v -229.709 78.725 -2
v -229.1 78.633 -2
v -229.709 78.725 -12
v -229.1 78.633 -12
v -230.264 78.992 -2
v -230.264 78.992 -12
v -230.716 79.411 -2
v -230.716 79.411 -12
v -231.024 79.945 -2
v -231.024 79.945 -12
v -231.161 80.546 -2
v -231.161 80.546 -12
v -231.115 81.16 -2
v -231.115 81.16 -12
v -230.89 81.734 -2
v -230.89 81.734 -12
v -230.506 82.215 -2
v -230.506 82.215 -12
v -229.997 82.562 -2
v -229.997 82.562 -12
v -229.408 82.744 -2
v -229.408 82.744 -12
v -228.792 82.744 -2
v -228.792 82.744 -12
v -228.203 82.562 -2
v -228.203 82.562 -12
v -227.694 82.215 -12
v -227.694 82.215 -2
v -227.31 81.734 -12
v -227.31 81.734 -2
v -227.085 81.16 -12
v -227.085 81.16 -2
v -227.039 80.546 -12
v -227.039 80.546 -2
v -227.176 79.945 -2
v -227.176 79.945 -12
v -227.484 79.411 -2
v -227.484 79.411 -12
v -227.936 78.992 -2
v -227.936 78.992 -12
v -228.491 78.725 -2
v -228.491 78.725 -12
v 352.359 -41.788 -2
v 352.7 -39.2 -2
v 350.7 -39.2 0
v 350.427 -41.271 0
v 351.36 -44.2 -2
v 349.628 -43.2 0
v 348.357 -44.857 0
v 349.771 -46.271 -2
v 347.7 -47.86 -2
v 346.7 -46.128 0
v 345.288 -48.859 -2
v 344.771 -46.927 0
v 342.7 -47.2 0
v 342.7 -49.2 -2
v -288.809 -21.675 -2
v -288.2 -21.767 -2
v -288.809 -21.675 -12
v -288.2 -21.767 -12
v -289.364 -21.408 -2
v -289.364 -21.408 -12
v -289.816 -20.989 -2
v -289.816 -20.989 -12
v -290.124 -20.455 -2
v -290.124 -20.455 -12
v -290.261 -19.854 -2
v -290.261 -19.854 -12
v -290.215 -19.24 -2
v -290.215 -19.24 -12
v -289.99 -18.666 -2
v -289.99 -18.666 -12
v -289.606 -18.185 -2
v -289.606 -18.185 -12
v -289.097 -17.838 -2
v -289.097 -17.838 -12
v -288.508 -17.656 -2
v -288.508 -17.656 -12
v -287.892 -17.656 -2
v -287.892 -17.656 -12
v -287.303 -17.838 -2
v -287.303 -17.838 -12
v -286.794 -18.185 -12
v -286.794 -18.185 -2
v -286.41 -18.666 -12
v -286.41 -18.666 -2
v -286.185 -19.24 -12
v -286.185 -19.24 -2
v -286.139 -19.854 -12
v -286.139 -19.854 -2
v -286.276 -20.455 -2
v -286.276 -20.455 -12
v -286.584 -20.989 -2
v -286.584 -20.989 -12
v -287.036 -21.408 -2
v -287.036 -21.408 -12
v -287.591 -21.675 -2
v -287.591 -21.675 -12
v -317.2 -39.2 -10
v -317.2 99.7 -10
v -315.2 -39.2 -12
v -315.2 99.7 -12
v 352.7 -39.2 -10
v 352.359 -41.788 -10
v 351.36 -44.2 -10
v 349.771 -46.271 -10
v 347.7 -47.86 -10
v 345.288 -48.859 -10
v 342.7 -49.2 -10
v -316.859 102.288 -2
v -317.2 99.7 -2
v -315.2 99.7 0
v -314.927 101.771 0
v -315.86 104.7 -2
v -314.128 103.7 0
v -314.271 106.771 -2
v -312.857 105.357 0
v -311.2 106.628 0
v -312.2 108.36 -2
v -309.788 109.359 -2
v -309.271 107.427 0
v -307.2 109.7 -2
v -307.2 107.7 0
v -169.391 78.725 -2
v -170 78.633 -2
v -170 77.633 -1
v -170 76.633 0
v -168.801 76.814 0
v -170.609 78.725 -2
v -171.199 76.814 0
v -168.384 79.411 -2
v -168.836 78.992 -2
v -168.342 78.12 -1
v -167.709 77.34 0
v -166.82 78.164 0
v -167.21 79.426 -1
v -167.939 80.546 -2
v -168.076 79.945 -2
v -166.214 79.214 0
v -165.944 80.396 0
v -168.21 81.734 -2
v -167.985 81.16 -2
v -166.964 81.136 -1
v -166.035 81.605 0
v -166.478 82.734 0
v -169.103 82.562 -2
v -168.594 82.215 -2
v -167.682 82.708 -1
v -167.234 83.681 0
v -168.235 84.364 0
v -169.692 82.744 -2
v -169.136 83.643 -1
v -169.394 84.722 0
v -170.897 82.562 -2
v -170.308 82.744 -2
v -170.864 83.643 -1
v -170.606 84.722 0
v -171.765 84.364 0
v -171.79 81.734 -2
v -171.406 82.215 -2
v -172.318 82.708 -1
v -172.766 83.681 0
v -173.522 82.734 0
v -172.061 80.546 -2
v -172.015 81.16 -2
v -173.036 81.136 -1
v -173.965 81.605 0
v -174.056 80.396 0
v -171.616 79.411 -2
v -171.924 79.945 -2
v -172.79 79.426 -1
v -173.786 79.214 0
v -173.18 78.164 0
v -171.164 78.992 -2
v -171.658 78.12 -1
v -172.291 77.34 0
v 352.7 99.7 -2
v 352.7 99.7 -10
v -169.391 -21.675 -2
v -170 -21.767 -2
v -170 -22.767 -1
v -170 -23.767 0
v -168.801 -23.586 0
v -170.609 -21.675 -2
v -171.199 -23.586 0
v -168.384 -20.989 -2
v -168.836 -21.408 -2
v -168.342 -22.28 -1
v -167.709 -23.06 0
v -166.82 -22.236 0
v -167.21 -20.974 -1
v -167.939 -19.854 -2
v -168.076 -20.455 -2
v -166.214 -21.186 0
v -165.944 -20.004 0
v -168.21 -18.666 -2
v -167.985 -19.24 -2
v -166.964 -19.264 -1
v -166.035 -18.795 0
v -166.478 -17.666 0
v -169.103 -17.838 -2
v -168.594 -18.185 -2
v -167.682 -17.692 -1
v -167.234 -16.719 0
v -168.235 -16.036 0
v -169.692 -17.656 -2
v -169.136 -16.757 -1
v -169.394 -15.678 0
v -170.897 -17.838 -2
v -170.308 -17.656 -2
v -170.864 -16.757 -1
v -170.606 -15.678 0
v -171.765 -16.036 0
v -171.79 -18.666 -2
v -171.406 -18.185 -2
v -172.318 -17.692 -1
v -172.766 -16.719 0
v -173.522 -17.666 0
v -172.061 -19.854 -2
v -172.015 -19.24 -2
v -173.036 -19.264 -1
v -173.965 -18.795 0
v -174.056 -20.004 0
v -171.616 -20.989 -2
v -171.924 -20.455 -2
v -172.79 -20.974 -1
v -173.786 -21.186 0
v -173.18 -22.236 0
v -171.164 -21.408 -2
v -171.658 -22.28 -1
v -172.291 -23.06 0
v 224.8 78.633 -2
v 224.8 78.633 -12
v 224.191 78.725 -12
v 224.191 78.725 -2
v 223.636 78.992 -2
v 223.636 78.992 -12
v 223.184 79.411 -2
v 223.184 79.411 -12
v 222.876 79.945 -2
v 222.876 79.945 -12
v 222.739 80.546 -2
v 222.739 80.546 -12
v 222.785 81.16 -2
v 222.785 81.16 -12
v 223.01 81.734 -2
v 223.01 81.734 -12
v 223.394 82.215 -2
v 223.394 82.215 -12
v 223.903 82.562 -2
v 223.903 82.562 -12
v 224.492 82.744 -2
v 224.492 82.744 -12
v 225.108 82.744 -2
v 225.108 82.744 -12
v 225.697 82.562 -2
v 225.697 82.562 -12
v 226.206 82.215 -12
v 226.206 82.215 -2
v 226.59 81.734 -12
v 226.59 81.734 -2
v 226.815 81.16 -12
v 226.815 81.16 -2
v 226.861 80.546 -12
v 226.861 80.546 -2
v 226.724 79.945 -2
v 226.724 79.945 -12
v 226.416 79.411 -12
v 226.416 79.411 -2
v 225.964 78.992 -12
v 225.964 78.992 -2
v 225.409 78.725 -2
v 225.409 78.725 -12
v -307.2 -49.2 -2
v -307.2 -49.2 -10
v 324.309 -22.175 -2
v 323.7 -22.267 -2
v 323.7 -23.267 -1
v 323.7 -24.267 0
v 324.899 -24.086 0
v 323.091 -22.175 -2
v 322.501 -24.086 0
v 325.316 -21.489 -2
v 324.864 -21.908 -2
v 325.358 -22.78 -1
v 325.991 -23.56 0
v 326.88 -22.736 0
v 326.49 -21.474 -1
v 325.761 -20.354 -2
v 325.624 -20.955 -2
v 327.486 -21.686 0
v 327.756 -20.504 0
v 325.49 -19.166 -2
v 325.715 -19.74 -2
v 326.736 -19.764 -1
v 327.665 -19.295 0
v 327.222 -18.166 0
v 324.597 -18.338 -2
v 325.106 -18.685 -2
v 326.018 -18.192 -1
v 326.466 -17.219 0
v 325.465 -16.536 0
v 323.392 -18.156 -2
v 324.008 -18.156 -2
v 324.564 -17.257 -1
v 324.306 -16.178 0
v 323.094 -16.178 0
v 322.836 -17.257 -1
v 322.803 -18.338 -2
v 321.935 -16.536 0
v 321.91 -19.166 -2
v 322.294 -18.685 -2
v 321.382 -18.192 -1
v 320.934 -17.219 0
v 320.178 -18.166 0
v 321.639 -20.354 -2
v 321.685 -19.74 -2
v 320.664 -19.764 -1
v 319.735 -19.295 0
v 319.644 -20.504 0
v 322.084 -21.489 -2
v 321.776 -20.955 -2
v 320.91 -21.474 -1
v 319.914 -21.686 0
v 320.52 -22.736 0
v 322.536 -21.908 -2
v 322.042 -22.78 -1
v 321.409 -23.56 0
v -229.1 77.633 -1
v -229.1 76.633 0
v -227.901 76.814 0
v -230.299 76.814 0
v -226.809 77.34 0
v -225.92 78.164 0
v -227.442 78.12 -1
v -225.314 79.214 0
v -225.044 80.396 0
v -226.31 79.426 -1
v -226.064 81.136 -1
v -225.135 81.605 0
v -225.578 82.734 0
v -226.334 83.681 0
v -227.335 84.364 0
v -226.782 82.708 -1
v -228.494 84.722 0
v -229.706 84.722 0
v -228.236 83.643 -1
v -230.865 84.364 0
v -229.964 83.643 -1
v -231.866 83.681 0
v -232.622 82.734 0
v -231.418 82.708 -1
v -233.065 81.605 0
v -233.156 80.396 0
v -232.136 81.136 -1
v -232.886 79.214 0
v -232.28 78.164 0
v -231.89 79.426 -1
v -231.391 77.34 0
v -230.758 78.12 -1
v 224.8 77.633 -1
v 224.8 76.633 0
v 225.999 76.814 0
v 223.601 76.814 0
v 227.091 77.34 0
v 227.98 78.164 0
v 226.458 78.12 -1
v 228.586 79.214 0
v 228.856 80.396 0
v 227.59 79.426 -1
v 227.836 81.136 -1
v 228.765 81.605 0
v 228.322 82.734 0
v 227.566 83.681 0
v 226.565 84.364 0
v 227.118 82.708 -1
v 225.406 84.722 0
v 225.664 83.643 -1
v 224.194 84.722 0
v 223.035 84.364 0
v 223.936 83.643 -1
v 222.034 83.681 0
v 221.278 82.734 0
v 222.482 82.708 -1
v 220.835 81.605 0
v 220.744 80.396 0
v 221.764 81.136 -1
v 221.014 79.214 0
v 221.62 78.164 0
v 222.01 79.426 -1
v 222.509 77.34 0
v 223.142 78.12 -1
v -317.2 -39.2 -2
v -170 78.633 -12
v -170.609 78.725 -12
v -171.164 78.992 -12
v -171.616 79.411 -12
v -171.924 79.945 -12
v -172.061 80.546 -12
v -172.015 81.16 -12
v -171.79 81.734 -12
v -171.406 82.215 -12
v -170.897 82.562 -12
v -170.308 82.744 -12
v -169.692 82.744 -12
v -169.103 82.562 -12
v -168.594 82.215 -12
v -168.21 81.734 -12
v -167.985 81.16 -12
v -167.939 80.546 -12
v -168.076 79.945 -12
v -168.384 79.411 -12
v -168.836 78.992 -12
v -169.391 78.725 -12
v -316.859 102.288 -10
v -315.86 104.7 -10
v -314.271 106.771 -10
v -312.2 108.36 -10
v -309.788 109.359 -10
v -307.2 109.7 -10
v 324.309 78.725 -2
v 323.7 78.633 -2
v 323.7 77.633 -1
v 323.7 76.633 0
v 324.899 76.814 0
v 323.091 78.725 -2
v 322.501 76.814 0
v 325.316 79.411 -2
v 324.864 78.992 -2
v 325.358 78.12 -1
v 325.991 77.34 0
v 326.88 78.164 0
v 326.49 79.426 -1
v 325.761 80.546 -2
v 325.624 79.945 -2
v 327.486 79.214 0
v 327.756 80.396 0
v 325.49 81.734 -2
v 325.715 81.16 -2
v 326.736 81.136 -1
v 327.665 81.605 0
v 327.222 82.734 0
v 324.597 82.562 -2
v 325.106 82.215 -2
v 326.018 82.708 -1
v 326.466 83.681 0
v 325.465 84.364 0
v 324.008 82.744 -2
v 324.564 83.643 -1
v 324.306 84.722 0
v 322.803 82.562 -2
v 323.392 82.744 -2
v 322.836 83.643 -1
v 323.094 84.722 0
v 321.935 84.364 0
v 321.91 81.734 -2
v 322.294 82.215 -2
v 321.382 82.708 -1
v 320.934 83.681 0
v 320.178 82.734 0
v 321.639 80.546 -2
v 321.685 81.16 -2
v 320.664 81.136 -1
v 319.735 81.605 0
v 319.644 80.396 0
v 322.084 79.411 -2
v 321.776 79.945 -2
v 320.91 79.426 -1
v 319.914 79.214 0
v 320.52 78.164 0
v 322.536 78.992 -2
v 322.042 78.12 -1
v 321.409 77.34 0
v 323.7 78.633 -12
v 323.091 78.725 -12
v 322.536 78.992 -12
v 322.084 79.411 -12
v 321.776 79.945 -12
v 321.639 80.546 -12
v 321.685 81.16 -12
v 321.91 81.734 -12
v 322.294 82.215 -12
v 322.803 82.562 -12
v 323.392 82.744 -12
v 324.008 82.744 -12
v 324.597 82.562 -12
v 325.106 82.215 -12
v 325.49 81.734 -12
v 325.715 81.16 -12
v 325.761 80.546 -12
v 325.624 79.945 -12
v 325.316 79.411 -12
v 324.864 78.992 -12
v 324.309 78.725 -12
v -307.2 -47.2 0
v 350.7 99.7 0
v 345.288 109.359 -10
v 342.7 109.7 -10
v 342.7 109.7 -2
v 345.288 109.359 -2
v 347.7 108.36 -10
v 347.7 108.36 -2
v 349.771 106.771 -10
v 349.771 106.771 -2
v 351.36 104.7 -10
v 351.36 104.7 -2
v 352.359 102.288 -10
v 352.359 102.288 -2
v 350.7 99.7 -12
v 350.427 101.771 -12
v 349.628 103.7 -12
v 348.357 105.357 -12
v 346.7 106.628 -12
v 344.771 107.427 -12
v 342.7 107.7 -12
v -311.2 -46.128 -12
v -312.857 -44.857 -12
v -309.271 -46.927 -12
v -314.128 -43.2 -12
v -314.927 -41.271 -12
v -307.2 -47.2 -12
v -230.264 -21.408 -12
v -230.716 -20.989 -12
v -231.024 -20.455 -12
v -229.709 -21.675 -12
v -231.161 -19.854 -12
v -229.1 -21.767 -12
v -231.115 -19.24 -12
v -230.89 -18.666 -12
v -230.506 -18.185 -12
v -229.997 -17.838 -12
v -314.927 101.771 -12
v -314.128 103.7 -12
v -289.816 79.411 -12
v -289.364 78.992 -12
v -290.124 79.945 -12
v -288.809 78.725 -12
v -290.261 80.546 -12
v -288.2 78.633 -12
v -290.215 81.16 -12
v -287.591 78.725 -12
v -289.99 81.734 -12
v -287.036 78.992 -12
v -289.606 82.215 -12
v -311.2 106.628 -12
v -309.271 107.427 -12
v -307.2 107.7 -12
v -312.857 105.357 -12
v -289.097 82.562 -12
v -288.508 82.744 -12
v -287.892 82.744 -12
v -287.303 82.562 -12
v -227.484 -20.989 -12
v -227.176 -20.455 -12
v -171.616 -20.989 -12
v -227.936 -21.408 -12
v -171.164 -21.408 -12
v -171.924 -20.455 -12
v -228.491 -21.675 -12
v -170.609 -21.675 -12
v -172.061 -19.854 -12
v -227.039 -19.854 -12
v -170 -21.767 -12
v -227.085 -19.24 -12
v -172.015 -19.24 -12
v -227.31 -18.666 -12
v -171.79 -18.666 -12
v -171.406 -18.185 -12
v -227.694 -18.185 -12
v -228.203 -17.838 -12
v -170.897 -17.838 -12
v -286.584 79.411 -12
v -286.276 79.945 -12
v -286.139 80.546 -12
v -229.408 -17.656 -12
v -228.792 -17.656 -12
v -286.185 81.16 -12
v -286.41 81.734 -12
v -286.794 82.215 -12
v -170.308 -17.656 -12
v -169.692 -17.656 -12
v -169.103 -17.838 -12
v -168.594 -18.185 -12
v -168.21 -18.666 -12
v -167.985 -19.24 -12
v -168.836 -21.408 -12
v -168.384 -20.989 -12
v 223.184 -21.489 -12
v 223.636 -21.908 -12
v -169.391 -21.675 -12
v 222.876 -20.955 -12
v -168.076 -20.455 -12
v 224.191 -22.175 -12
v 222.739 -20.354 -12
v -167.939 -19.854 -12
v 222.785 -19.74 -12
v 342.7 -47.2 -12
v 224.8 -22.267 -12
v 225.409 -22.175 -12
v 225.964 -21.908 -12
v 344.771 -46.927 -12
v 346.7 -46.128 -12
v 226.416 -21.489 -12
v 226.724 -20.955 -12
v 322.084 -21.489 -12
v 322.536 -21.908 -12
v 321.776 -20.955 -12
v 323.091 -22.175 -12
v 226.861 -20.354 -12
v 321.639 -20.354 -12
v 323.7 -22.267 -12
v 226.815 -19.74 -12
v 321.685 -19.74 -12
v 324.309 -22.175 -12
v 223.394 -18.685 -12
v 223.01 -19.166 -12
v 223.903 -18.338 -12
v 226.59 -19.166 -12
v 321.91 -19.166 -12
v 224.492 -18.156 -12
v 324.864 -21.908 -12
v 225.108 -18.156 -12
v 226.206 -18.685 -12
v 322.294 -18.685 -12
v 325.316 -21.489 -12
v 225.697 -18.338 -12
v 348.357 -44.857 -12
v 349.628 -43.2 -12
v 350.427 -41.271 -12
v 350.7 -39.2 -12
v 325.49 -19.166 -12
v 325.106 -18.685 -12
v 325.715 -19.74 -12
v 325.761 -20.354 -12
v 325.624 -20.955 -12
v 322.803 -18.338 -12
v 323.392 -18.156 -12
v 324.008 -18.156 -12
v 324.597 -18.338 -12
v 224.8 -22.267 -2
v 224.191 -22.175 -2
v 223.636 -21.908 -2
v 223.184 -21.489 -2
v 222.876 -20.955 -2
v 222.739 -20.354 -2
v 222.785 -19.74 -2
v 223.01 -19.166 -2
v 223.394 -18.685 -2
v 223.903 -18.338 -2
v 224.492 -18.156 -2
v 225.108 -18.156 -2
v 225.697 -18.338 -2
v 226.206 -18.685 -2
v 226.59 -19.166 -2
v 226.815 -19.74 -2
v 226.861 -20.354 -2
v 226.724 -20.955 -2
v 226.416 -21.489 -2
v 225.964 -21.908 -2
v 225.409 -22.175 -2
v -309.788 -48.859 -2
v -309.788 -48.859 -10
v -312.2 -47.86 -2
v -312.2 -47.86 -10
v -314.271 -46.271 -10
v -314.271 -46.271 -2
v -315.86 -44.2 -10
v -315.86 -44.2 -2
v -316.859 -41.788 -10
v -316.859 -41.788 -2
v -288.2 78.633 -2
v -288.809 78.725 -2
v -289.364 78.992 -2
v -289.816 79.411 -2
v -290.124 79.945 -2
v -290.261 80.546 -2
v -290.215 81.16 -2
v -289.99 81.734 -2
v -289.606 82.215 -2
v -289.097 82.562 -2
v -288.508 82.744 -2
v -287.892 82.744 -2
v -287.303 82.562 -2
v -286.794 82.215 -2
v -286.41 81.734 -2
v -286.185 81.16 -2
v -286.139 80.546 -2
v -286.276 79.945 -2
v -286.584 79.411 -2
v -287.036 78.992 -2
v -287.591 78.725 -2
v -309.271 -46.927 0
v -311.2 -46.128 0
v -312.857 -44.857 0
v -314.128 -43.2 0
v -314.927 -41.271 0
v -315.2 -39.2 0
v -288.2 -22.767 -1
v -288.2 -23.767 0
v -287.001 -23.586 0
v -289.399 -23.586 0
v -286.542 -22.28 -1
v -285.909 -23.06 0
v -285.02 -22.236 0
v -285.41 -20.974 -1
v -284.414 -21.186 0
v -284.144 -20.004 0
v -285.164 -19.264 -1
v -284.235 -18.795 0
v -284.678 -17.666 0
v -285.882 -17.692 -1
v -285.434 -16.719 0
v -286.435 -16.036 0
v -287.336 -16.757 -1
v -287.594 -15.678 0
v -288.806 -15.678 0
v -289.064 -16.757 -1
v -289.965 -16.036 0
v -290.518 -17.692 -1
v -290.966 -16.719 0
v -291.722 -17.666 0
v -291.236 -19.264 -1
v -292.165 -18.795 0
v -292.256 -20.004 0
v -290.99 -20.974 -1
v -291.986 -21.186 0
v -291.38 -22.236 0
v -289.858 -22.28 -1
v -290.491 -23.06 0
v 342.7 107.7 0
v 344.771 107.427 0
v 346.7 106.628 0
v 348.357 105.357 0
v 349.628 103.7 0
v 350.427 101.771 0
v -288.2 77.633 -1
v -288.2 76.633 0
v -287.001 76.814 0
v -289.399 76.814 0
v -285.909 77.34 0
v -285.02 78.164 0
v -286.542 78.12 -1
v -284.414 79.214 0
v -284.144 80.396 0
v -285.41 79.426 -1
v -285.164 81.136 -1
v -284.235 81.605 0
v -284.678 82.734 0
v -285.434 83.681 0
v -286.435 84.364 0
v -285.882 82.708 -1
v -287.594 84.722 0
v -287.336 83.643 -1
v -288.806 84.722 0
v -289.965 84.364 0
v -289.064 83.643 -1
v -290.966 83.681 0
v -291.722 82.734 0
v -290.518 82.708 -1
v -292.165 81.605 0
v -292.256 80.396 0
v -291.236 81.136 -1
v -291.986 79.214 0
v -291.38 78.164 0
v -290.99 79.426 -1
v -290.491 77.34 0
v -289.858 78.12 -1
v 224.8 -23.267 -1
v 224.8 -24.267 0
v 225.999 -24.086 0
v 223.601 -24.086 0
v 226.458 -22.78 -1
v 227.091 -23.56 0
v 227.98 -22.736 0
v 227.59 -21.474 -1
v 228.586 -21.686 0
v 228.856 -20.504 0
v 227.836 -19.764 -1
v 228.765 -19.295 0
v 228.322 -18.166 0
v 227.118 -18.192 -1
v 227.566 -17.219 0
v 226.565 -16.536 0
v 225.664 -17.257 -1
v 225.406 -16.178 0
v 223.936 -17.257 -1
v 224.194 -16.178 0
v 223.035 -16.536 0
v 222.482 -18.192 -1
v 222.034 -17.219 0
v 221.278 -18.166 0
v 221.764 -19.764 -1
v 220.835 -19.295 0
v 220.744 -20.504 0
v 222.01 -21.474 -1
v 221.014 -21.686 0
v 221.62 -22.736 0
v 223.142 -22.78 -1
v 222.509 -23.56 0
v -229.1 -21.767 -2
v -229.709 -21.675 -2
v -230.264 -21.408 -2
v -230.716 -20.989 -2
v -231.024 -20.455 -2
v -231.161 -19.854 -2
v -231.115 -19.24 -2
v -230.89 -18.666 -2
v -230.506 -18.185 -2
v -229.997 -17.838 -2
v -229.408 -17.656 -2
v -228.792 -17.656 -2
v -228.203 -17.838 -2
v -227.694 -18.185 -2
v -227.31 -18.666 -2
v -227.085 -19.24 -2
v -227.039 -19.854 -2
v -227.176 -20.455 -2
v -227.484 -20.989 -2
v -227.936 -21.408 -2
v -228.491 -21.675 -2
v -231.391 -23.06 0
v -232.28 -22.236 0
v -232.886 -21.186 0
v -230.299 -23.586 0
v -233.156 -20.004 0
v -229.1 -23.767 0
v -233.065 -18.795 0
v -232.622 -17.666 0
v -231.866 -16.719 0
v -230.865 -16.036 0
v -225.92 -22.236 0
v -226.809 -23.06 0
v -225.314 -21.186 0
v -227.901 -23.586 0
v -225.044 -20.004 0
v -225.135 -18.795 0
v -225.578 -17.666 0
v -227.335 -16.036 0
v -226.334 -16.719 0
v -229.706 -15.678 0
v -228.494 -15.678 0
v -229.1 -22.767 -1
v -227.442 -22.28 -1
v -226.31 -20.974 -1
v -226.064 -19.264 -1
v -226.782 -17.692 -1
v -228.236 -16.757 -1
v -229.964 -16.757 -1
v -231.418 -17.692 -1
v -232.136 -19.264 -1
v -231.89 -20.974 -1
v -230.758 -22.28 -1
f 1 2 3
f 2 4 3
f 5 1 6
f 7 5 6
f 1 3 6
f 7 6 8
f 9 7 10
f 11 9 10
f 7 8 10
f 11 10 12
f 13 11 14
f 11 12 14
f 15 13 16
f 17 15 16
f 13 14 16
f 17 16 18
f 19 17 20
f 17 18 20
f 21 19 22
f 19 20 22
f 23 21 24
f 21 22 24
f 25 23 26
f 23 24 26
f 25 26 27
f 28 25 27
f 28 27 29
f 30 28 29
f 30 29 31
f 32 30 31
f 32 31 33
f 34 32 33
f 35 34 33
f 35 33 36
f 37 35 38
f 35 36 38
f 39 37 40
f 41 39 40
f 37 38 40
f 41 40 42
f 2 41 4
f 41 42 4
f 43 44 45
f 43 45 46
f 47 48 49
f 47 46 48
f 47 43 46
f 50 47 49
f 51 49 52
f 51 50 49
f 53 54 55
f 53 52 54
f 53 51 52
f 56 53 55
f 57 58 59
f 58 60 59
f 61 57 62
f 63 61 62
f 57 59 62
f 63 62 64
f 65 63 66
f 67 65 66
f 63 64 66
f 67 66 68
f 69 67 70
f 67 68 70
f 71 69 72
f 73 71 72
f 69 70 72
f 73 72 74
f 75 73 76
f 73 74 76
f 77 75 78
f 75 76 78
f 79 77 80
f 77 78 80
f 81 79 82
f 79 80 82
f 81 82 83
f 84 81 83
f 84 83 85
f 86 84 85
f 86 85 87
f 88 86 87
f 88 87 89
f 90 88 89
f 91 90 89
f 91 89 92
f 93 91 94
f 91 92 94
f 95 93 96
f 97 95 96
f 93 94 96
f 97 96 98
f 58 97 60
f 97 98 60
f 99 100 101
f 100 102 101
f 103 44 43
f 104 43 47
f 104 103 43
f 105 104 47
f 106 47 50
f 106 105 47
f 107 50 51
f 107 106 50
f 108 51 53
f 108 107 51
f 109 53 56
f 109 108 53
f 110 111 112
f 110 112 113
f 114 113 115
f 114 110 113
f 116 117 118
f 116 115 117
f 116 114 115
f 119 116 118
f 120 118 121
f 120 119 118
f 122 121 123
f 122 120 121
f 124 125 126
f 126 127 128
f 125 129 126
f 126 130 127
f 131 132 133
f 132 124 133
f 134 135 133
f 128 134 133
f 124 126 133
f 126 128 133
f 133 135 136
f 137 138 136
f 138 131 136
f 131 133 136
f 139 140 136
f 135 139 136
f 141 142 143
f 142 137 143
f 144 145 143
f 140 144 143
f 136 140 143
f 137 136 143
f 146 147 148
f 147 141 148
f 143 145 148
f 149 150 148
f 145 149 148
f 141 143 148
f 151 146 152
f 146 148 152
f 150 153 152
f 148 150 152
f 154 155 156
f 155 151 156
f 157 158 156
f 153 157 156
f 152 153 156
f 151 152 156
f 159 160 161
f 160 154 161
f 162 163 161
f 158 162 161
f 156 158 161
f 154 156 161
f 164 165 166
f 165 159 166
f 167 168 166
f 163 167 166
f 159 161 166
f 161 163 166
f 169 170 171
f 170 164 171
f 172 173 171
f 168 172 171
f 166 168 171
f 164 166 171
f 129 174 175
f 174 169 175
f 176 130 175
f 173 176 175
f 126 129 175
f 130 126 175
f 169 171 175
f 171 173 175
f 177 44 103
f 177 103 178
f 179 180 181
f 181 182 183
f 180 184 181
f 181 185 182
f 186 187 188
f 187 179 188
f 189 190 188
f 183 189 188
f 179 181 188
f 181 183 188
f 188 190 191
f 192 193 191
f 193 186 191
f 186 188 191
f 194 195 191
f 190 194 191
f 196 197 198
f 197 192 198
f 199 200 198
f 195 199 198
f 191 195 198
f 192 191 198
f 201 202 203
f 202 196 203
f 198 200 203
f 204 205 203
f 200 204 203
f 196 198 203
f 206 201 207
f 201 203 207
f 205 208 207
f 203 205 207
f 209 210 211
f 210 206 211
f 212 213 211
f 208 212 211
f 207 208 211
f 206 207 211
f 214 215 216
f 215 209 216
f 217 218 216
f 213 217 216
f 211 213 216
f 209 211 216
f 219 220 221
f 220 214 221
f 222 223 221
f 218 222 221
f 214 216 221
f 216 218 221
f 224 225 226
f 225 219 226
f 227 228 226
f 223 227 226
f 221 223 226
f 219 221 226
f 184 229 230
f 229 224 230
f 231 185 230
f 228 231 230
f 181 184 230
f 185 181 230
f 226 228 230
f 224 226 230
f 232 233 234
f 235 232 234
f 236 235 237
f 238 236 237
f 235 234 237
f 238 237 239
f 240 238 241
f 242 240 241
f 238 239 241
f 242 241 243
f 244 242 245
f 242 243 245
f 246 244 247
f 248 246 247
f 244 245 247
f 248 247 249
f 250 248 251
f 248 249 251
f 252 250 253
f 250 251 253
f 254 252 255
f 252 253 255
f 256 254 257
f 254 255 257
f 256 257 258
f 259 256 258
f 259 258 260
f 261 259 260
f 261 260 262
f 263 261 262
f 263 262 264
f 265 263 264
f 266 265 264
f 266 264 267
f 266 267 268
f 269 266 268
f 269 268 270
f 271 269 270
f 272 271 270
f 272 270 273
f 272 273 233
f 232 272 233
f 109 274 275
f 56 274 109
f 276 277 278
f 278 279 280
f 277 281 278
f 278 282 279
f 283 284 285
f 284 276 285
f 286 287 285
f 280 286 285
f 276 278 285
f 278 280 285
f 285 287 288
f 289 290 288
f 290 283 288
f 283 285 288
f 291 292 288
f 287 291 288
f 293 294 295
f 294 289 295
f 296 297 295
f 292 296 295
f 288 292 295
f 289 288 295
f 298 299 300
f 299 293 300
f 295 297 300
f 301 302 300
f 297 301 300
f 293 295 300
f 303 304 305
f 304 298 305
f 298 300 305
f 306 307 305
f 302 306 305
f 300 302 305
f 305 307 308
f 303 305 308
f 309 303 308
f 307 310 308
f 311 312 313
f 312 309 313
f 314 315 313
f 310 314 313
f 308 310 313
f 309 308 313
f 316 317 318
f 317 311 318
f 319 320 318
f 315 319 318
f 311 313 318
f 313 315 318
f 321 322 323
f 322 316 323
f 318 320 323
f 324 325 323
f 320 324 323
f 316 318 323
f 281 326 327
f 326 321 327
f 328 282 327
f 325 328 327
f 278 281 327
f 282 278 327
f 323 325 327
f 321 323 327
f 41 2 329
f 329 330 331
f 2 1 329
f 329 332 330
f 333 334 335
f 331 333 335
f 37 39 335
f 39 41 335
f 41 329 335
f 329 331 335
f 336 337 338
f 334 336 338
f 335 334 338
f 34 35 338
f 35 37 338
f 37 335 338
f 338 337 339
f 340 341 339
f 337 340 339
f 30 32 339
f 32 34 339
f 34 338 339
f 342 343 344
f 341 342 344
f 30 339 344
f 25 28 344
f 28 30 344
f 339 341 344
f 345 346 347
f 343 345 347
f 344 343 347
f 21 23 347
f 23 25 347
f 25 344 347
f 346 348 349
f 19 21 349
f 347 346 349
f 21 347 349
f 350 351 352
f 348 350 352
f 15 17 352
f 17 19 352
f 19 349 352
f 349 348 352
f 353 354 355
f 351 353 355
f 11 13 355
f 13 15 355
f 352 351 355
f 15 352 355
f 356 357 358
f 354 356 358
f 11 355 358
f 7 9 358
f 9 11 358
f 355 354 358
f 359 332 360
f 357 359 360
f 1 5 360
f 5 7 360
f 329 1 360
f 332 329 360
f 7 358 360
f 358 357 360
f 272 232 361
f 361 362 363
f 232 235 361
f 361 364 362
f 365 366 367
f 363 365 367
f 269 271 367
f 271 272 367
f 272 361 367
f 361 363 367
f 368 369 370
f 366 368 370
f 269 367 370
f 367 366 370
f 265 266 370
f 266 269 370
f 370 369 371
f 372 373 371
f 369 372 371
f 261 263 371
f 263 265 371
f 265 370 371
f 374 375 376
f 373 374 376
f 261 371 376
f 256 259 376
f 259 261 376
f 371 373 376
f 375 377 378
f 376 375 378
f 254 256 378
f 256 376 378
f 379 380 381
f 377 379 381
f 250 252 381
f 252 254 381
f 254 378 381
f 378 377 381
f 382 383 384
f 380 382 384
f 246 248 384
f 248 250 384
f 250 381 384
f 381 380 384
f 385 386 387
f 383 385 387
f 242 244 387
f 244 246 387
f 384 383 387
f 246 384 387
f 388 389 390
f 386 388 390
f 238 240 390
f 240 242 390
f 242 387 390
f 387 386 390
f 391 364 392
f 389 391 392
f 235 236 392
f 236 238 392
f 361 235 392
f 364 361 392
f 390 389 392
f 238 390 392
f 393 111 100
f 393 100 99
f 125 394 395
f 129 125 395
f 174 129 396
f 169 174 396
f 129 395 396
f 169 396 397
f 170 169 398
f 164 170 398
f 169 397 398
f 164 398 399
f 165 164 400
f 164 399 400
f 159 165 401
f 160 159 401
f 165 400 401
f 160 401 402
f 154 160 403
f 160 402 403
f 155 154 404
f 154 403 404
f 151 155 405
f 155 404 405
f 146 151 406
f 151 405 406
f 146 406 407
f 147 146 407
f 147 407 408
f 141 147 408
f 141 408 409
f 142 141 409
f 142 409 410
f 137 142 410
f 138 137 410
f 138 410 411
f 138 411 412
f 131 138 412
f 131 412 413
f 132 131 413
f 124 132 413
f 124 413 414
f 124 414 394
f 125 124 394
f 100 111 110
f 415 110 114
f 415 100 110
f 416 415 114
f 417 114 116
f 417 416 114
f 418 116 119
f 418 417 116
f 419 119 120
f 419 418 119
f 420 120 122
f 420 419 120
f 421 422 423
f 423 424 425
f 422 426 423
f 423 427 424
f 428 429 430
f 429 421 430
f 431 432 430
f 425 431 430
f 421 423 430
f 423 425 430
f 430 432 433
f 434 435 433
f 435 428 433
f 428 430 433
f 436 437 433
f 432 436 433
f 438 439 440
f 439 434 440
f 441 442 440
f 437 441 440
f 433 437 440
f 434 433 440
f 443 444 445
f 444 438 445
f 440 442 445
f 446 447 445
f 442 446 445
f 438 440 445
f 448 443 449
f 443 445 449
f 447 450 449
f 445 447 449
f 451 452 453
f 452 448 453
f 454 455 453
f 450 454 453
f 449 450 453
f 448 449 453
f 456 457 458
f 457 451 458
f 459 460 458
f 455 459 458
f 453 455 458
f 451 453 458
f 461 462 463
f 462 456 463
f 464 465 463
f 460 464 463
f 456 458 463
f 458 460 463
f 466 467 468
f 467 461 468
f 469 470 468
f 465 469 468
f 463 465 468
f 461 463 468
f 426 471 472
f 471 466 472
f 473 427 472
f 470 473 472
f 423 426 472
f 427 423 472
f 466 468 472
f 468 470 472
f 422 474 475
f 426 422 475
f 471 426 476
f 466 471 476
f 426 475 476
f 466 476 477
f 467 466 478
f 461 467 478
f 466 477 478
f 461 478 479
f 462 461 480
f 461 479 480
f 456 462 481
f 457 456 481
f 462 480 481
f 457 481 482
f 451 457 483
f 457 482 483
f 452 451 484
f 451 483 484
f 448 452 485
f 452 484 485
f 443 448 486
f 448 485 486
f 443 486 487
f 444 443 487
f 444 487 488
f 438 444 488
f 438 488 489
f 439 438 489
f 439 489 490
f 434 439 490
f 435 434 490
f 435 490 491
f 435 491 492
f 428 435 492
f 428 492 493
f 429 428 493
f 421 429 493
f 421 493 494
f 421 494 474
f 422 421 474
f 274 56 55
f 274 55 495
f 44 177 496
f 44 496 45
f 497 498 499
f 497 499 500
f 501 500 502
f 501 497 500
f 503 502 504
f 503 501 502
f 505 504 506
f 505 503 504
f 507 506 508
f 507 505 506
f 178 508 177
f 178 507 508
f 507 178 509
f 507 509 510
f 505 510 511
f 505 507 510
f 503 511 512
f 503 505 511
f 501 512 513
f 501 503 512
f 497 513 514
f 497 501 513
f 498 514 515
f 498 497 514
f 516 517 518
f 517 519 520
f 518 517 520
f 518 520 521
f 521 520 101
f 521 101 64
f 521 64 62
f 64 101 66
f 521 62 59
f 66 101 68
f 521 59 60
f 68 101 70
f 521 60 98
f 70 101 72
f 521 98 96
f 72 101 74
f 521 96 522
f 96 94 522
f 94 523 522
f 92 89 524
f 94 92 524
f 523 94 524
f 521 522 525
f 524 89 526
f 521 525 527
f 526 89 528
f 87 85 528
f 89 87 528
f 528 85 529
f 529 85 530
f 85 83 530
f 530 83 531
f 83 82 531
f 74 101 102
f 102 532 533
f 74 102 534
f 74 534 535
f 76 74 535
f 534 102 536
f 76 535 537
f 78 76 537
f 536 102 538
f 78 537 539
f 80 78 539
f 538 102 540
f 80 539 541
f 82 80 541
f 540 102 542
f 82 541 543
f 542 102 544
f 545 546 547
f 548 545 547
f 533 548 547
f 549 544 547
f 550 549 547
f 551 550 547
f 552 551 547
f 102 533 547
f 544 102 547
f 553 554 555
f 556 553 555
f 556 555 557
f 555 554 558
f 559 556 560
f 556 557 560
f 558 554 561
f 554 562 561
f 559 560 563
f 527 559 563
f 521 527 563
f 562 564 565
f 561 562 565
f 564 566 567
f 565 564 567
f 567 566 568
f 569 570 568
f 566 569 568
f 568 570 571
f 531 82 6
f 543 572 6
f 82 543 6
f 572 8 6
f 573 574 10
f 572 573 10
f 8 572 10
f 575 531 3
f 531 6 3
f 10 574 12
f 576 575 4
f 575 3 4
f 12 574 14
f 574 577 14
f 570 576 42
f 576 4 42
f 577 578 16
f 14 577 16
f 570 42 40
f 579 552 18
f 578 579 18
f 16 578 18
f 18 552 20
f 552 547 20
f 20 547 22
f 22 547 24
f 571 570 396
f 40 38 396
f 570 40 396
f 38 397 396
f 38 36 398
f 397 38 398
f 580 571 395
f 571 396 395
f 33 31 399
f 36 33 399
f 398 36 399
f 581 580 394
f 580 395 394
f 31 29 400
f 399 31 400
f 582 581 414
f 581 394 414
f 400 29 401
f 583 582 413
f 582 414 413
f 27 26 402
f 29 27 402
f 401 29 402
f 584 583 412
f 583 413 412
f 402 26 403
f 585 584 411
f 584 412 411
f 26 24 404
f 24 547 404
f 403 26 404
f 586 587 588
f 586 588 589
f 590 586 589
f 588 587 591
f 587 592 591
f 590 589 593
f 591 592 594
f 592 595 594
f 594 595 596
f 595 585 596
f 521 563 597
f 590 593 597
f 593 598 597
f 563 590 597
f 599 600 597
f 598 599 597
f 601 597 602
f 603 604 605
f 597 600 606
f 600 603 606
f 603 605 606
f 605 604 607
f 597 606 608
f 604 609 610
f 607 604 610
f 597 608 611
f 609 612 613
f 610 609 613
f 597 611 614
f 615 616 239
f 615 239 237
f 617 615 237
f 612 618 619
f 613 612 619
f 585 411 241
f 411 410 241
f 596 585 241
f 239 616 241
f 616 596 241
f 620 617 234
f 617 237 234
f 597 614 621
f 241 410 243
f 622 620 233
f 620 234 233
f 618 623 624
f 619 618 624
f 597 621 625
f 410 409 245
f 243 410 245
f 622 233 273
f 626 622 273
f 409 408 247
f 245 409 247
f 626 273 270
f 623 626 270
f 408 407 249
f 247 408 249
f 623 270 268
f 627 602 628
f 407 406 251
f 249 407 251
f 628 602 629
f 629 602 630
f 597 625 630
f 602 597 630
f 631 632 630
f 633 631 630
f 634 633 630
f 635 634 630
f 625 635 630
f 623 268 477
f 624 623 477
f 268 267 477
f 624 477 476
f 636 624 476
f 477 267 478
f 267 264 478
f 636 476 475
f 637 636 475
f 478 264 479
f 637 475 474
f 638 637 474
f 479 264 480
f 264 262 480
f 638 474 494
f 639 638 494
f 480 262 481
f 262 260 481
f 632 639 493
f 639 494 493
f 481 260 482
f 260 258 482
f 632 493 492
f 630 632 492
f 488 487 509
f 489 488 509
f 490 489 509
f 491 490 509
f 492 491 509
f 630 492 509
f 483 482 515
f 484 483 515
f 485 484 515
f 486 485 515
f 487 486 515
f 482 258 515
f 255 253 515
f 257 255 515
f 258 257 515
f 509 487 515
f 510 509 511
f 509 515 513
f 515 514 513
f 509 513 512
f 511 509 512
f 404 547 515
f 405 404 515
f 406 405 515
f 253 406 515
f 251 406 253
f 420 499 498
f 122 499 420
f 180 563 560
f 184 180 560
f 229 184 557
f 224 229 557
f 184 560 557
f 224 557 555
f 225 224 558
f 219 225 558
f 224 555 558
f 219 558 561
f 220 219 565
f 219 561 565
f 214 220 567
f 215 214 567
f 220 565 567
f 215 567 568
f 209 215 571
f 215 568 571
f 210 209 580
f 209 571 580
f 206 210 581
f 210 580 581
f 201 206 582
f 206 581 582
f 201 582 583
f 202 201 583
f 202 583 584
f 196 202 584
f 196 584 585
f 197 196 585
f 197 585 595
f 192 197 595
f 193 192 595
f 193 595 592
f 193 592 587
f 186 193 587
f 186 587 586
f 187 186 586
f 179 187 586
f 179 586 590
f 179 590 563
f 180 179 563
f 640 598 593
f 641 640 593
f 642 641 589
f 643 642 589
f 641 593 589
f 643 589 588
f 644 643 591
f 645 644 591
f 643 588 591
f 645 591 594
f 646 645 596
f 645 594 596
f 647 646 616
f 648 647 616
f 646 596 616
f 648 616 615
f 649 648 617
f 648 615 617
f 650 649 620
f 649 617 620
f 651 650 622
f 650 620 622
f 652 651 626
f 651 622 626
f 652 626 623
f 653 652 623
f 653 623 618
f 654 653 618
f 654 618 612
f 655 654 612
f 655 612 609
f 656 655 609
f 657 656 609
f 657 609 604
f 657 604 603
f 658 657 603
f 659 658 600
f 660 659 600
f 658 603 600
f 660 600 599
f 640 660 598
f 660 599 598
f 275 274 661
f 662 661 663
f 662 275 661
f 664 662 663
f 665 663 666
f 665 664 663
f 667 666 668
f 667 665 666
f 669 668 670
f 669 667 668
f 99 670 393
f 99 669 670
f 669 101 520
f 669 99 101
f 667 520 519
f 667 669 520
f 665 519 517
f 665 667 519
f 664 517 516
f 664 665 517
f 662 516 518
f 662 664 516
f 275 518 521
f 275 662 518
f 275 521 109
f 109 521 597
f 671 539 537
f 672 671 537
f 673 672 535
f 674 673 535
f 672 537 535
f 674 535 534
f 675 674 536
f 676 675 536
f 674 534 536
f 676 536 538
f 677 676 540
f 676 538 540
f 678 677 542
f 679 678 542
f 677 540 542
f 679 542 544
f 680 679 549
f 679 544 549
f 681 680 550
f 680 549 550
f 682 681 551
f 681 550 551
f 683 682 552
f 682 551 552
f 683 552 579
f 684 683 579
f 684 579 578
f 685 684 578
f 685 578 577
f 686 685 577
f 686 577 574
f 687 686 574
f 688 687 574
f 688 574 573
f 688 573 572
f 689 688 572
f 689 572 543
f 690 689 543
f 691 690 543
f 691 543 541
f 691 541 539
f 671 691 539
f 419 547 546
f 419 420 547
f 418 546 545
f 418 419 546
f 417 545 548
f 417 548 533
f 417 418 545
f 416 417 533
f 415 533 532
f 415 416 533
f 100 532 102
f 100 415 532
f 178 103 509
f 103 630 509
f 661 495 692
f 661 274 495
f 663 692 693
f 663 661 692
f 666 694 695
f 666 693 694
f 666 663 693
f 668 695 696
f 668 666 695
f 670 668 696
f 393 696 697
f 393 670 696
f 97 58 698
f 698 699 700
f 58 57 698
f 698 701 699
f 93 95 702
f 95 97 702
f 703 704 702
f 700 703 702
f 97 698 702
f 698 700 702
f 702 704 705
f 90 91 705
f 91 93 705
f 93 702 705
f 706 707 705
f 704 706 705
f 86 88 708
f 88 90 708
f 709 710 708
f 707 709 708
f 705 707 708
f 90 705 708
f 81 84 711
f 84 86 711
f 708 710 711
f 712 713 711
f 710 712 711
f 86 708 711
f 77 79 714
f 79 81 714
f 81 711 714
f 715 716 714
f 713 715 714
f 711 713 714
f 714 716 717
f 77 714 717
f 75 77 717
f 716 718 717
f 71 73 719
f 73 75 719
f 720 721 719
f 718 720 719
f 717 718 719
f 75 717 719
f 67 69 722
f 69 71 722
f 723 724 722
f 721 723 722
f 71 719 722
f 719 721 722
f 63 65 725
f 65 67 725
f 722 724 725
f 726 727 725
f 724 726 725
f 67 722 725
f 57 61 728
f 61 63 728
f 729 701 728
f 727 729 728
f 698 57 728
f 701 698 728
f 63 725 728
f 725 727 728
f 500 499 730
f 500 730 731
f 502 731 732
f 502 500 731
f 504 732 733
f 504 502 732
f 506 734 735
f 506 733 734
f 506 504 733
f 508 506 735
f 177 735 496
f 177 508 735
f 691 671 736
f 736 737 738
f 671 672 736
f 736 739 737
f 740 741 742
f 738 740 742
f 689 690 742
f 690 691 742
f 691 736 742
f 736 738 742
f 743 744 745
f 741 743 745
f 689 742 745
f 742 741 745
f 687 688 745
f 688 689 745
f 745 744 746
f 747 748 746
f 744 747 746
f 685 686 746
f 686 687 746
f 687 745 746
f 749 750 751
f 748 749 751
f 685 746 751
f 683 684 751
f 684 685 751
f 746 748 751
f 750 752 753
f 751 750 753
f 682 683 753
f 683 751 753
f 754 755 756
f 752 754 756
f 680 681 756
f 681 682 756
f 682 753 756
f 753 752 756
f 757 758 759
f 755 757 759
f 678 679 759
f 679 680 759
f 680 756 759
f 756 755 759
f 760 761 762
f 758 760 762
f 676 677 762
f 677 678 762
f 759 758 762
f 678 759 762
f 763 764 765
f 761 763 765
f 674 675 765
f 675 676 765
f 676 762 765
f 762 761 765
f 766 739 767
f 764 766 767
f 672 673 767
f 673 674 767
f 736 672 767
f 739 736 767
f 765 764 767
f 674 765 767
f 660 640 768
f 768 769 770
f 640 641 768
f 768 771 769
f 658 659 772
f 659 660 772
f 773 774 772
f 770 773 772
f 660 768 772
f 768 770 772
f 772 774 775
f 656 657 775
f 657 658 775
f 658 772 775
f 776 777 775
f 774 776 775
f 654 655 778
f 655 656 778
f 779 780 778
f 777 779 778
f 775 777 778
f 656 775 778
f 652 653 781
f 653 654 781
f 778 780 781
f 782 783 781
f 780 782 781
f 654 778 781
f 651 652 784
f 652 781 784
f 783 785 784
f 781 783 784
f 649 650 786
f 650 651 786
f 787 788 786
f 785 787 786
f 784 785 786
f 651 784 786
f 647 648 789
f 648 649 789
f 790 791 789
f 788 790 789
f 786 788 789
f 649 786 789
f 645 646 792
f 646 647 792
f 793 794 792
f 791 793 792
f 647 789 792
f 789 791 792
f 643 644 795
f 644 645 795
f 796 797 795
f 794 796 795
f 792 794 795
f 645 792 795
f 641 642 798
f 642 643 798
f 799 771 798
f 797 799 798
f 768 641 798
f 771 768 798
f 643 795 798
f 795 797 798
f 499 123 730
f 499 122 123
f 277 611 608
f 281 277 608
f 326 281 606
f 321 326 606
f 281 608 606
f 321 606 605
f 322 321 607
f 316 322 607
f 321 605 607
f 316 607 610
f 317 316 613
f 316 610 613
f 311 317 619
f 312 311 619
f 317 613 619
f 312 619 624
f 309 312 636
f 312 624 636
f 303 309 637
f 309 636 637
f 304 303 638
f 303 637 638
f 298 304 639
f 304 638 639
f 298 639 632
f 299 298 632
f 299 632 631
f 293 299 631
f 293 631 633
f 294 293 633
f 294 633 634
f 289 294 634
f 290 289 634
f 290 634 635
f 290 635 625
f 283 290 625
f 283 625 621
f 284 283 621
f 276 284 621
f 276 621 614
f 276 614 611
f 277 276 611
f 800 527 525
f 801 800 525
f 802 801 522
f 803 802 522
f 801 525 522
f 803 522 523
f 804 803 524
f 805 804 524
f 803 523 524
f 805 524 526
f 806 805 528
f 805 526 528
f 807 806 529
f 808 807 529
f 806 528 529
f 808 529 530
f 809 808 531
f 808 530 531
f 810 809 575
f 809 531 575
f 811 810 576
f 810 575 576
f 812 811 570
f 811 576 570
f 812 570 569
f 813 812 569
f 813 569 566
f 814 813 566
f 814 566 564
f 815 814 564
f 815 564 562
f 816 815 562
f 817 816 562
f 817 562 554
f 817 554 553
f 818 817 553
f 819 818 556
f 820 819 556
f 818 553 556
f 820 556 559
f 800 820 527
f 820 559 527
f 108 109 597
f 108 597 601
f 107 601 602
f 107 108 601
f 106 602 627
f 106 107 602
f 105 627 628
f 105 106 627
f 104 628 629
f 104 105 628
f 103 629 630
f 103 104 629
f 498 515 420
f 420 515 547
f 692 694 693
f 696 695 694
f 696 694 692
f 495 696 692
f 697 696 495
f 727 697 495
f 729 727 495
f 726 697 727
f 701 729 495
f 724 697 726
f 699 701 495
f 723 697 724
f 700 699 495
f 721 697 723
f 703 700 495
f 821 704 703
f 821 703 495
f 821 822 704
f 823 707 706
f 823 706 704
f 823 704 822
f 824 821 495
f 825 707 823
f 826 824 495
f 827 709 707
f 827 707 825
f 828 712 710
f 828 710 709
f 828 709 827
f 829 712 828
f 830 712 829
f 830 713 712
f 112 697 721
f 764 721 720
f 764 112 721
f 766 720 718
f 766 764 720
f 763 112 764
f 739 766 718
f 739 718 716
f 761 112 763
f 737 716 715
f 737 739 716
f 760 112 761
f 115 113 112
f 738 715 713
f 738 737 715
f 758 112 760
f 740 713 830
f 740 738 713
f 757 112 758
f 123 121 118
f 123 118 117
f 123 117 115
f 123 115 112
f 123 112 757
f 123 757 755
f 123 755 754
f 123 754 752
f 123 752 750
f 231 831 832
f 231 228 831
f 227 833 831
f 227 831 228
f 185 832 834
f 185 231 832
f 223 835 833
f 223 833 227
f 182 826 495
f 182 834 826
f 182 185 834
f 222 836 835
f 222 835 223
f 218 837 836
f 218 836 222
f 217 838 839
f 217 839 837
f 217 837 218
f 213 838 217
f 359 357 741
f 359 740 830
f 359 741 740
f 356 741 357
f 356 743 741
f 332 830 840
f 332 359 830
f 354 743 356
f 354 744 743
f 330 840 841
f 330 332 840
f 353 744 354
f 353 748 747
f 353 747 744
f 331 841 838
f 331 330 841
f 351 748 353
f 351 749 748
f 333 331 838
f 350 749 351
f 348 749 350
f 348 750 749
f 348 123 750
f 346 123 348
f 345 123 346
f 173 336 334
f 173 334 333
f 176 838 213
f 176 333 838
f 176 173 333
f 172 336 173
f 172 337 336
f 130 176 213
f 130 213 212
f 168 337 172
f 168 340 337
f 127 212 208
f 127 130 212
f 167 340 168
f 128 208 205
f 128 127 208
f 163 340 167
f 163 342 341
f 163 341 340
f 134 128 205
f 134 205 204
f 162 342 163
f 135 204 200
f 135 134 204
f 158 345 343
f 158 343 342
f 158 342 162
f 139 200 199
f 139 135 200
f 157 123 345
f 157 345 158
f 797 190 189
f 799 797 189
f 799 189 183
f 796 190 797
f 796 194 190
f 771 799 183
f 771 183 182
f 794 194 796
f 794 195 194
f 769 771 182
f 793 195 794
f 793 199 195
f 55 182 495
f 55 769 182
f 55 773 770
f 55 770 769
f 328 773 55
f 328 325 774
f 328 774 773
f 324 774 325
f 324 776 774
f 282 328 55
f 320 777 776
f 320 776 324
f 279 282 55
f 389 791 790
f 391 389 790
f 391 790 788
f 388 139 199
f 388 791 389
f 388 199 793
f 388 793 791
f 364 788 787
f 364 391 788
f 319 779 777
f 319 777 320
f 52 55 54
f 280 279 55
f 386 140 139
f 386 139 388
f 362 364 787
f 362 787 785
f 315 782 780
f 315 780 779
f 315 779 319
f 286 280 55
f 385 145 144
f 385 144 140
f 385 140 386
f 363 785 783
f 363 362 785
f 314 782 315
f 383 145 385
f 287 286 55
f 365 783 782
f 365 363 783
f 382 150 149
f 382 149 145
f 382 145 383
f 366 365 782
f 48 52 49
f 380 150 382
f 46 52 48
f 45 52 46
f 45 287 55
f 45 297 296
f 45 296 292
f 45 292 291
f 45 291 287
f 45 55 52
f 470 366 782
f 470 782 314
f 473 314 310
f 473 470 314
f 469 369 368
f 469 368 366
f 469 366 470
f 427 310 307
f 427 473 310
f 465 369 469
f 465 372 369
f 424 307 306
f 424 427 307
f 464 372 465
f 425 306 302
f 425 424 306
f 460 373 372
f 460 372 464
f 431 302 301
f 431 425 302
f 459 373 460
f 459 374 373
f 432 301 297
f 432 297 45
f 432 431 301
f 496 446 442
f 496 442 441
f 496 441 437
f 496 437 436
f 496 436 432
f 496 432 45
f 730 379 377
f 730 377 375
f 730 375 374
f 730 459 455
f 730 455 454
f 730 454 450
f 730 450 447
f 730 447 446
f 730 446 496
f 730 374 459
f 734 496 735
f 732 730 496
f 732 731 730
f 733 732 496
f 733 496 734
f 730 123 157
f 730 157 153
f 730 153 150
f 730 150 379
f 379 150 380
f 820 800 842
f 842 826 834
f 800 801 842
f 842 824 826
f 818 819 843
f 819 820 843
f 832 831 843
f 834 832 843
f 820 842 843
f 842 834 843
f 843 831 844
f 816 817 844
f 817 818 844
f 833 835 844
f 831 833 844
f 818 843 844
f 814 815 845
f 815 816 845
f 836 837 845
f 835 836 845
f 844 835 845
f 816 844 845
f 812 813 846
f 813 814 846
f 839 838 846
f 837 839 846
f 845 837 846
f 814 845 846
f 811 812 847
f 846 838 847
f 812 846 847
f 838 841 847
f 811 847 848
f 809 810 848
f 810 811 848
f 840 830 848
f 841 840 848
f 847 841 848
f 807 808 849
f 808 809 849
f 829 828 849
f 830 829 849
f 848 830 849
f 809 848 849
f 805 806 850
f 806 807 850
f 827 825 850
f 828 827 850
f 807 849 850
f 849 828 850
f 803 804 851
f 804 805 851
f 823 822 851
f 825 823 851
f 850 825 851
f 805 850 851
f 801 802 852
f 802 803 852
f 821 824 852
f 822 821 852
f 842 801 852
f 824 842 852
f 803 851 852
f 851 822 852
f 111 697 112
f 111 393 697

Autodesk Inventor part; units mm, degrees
ref_plane "YZ Plane" through (0, 0, 0) normal (1, 0, 0) x (0, 1, 0)
ref_plane "XZ Plane" through (0, 0, 0) normal (0, 1, 0) x (-1, 0, 0)
ref_plane "XY Plane" through (0, 0, 0) normal (0, 0, 1) x (1, 0, 0)
sketch "Sketch1" plane through (0, 0, 0) normal (0, 0, 1) x (1, 0, 0)
  circle A0 centre (323.7, 80.7) radius 3.75 projected
  circle A1 centre (224.8, -20.2) radius 3.75 projected
  line L0 (219.8, -29.2) -> (328.7, -29.2) projected
  arc A2 (215.8, -25.2) -> (219.8, -29.2) centre (219.8, -25.2) ccw projected
  line L1 (215.8, 85.7) -> (215.8, -25.2) projected
  arc A3 (219.8, 89.7) -> (215.8, 85.7) centre (219.8, 85.7) ccw projected
  line L2 (328.7, 89.7) -> (219.8, 89.7) projected
  arc A4 (332.7, 85.7) -> (328.7, 89.7) centre (328.7, 85.7) ccw projected
  line L3 (332.7, -25.2) -> (332.7, 85.7) projected
  arc A5 (328.7, -29.2) -> (332.7, -25.2) centre (328.7, -25.2) ccw projected
  circle A6 centre (224.8, 80.7) radius 3.75 projected
  circle A7 centre (323.7, -20.2) radius 3.75 projected
  circle A8 centre (-229.1, -19.7) radius 3.75 projected
  circle A9 centre (-288.2, -19.7) radius 3.75 projected
  circle A10 centre (-170, 80.7) radius 3.75 projected
  line L4 (-165, 89.7) -> (-293.2, 89.7) projected
  arc A11 (-161, 85.7) -> (-165, 89.7) centre (-165, 85.7) ccw projected
  line L5 (-161, -24.7) -> (-161, 85.7) projected
  arc A12 (-165, -28.7) -> (-161, -24.7) centre (-165, -24.7) ccw projected
  line L6 (-293.2, -28.7) -> (-165, -28.7) projected
  arc A13 (-297.2, -24.7) -> (-293.2, -28.7) centre (-293.2, -24.7) ccw projected
  arc A14 (-293.2, 89.7) -> (-297.2, 85.7) centre (-293.2, 85.7) ccw projected
  circle A15 centre (-170, -19.7) radius 3.75 projected
  circle A16 centre (-288.2, 80.7) radius 3.75 projected
  circle A17 centre (-229.1, 80.7) radius 3.75 projected
  line L7 (352.7, 109.7) -> (-317.2, 109.7)
  line L8 (-317.2, 109.7) -> (-317.2, -49.2)
  line L9 (-317.2, -49.2) -> (352.7, -49.2)
  line L10 (352.7, -49.2) -> (352.7, 109.7)
  line L11 (-297.2, 85.7) -> (-297.2, -24.7) projected
  point P0 (0, 0)
  dimension "d0" = 20
  dimension "d1" = 20
  dimension "d2" = 20
extrude "Extrusion1" add sketch "Sketch1" against normal blind 12 contours A0 | A1 | A2 L1 A3 L2 A4 L3 A5 L0 | A6 | A7 | A8 | A9 | A10 | A11 L5 A12 L6 A13 L11 A14 L4 | A15 | A16 | A17 | L10 L9 L8 L7
fillet "Fillet1" radius 10 4 edges at (352.7, 109.7, -6) (352.7, -49.2, -6) (-317.2, -49.2, -6) (-317.2, 109.7, -6)
sketch "Sketch2" plane through (0, 0, 0) normal (0, 0, 1) x (1, 0, 0)
  circle A0 centre (323.7, -20.2) radius 2.75 projected
  circle A1 centre (224.8, -20.2) radius 2.75 projected
  circle A2 centre (323.7, 80.7) radius 3.75 projected
  circle A3 centre (224.8, 80.7) radius 3.75 projected
  circle A4 centre (-170, 80.7) radius 3.75 projected
  circle A5 centre (-229.1, 80.7) radius 3.75 projected
  circle A6 centre (-288.2, 80.7) radius 3.75 projected
  circle A7 centre (-288.2, -19.7) radius 2.75 projected
  circle A8 centre (-229.1, -19.7) radius 2.75 projected
  circle A9 centre (-170, -19.7) radius 3.75 projected
  point P0 (0, 0)
hole "Hole1" at (323.7, 80.7, 0) at (224.8, 80.7, 0) at (323.7, -20.2, 0) at (224.8, -20.2, 0) at (-170, -19.7, 0) at (-229.1, -19.7, 0) at (-288.2, -19.7, 0) at (-288.2, 80.7, 0) at (-229.1, 80.7, 0) at (-170, 80.7, 0) direction (0, 0, -1) diameter 4.134 end through all thread size "M5x0.8" class "6H" standard "ANSI Metric M Profile"
chamfer "Chamfer1" distance 2 angle 45 10 edges at (323.7, -18.133, 0) (323.7, 82.767, 0) (224.8, 82.767, 0) (224.8, -18.133, 0) (-170, -17.633, 0) (-170, 82.767, 0) (-229.1, 82.767, 0) (-288.2, 82.767, 0) (-288.2, -17.633, 0) (-229.1, -17.633, 0)
chamfer "Chamfer2" distance 2 angle 45 16 edges at (17.75, 109.7, 0) (-314.2711, 106.7711, 0) (-317.2, 30.25, 0) (-314.2711, -46.2711, 0) (17.75, -49.2, 0) (349.7711, -46.2711, 0) (352.7, 30.25, 0) (349.7711, 106.7711, 0) (17.75, 109.7, -12) (349.7711, 106.7711, -12) (352.7, 30.25, -12) (349.7711, -46.2711, -12) (17.75, -49.2, -12) (-314.2711, -46.2711, -12) (-317.2, 30.25, -12) (-314.2711, 106.7711, -12)
sketch "Sketch3" plane through (0, 0, 0) normal (0, 0, 1) x (1, 0, 0)
  arc A0 (342.7, -49.2) -> (352.7, -39.2) centre (342.7, -39.2) ccw projected
  line L0 (-307.2, -49.2) -> (342.7, -49.2) projected
  line L1 (352.7, -39.2) -> (352.7, 99.7) projected
  arc A1 (352.7, 99.7) -> (342.7, 109.7) centre (342.7, 99.7) ccw projected
  line L2 (342.7, 109.7) -> (-307.2, 109.7) projected
  arc A2 (-307.2, 109.7) -> (-317.2, 99.7) centre (-307.2, 99.7) ccw projected
  line L3 (-317.2, 99.7) -> (-317.2, -39.2) projected
  arc A3 (-317.2, -39.2) -> (-307.2, -49.2) centre (-307.2, -39.2) ccw projected
  circle A4 centre (-288.2, -19.7) radius 2.067 projected
  circle A5 centre (-288.2, 80.7) radius 2.067 projected
  circle A6 centre (-229.1, 80.7) radius 2.067 projected
  circle A7 centre (-170, 80.7) radius 2.067 projected
  circle A8 centre (-170, -19.7) radius 2.067 projected
  circle A9 centre (-229.1, -19.7) radius 2.067 projected
  circle A10 centre (224.8, -20.2) radius 2.067 projected
  circle A11 centre (323.7, -20.2) radius 2.067 projected
  circle A12 centre (323.7, 80.7) radius 2.067 projected
  circle A13 centre (224.8, 80.7) radius 2.067 projected
  point P0 (0, 0)
properties part number "MountingPlate" material "Steel"
